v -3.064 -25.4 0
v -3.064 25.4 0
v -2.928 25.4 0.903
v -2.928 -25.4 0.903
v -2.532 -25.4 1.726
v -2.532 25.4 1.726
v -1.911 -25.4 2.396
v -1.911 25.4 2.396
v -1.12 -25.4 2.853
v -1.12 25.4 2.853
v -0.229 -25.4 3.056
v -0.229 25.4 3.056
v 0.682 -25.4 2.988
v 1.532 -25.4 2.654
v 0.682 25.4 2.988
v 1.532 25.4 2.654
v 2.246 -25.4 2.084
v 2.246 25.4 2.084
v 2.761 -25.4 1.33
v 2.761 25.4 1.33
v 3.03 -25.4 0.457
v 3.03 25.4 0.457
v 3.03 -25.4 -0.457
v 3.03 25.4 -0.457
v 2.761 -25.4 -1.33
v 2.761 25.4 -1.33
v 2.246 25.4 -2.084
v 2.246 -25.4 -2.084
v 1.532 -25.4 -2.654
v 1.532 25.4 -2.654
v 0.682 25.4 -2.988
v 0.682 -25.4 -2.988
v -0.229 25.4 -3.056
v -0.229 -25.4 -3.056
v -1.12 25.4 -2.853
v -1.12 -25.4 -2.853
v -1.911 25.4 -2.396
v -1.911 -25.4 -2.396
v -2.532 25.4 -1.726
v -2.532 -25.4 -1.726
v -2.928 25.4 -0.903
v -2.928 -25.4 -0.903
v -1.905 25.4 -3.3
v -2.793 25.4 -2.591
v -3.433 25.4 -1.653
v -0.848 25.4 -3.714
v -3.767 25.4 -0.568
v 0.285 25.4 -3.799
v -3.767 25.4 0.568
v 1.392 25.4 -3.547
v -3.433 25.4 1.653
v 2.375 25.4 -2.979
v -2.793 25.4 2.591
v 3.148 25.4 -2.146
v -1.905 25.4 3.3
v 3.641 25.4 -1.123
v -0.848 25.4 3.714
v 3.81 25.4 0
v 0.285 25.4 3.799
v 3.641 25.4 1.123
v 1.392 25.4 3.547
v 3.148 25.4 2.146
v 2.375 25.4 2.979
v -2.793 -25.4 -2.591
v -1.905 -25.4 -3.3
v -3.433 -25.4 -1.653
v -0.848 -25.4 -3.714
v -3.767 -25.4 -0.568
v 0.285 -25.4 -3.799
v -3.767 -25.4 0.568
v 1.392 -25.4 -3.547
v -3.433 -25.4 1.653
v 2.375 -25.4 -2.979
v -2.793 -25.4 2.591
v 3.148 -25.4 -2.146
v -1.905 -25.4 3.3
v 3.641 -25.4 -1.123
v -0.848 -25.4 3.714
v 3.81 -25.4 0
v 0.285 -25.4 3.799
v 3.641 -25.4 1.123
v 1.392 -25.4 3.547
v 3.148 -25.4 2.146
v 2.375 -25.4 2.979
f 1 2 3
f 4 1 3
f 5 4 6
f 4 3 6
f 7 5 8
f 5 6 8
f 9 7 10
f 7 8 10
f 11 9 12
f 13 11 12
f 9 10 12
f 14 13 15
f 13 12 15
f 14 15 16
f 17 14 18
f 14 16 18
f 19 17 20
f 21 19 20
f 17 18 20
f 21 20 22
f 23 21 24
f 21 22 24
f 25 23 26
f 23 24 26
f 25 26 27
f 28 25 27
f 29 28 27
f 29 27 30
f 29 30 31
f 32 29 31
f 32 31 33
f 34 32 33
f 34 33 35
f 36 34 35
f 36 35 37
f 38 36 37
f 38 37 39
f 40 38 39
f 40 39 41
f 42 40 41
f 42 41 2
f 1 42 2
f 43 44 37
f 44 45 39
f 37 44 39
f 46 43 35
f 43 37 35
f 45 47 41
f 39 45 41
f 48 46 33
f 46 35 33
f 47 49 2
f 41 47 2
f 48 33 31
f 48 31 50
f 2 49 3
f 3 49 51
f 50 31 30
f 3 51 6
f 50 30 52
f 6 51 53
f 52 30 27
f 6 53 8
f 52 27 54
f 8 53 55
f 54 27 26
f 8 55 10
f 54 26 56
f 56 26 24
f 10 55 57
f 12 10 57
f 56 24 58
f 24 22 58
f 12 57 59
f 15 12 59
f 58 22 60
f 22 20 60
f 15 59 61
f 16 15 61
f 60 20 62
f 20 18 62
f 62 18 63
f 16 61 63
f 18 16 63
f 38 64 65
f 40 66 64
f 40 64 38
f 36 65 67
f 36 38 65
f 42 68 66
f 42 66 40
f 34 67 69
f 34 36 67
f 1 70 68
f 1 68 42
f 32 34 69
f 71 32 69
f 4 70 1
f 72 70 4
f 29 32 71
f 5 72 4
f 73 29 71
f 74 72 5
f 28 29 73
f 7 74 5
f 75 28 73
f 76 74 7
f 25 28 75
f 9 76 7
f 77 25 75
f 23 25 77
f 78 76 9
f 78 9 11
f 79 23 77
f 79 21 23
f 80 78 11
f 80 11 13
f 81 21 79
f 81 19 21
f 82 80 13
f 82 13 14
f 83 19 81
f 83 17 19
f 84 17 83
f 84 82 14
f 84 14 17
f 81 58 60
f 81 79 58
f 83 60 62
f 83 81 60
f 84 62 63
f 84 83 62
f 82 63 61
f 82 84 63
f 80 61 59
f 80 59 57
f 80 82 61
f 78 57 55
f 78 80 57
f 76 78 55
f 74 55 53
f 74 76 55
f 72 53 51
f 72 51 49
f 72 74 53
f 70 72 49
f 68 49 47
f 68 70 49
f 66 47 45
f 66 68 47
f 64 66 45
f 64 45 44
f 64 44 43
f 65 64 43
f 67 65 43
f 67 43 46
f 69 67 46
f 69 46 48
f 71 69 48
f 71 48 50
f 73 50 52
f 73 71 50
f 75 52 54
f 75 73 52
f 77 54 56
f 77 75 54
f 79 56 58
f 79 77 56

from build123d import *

# Parameters (mm, degrees)
F0_R     = 3.81
F1_DEPTH = 25.4
F3_DEPTH = 25.4
F4_R     = 3.0643911348
F5_DEPTH = 50.801


# Not quite as in the source:
# - the program builds the solid bodies; features that only make, move or delete a surface that nothing else refers to are left out


with BuildPart() as f1:
    # F0 (on Front) → F1 (new body)
    with BuildSketch(Plane.XZ):
        Circle(F0_R)
    extrude(amount=F1_DEPTH)

    # F3 (add): a face of the model
    f3_faces = [f1.faces().sort_by_distance(p)[0] for p in [
        (0, 0, 0),
    ]]
    extrude(f3_faces, amount=F3_DEPTH)

    # F4 (on face) → F5 (cut, through all)
    with BuildSketch(Plane(origin=(0, 25.4, 0), x_dir=(-1, 0, 0), z_dir=(0, 1, 0))):
        Circle(F4_R)
    extrude(amount=-F5_DEPTH, mode=Mode.SUBTRACT)


solid = f1.part
